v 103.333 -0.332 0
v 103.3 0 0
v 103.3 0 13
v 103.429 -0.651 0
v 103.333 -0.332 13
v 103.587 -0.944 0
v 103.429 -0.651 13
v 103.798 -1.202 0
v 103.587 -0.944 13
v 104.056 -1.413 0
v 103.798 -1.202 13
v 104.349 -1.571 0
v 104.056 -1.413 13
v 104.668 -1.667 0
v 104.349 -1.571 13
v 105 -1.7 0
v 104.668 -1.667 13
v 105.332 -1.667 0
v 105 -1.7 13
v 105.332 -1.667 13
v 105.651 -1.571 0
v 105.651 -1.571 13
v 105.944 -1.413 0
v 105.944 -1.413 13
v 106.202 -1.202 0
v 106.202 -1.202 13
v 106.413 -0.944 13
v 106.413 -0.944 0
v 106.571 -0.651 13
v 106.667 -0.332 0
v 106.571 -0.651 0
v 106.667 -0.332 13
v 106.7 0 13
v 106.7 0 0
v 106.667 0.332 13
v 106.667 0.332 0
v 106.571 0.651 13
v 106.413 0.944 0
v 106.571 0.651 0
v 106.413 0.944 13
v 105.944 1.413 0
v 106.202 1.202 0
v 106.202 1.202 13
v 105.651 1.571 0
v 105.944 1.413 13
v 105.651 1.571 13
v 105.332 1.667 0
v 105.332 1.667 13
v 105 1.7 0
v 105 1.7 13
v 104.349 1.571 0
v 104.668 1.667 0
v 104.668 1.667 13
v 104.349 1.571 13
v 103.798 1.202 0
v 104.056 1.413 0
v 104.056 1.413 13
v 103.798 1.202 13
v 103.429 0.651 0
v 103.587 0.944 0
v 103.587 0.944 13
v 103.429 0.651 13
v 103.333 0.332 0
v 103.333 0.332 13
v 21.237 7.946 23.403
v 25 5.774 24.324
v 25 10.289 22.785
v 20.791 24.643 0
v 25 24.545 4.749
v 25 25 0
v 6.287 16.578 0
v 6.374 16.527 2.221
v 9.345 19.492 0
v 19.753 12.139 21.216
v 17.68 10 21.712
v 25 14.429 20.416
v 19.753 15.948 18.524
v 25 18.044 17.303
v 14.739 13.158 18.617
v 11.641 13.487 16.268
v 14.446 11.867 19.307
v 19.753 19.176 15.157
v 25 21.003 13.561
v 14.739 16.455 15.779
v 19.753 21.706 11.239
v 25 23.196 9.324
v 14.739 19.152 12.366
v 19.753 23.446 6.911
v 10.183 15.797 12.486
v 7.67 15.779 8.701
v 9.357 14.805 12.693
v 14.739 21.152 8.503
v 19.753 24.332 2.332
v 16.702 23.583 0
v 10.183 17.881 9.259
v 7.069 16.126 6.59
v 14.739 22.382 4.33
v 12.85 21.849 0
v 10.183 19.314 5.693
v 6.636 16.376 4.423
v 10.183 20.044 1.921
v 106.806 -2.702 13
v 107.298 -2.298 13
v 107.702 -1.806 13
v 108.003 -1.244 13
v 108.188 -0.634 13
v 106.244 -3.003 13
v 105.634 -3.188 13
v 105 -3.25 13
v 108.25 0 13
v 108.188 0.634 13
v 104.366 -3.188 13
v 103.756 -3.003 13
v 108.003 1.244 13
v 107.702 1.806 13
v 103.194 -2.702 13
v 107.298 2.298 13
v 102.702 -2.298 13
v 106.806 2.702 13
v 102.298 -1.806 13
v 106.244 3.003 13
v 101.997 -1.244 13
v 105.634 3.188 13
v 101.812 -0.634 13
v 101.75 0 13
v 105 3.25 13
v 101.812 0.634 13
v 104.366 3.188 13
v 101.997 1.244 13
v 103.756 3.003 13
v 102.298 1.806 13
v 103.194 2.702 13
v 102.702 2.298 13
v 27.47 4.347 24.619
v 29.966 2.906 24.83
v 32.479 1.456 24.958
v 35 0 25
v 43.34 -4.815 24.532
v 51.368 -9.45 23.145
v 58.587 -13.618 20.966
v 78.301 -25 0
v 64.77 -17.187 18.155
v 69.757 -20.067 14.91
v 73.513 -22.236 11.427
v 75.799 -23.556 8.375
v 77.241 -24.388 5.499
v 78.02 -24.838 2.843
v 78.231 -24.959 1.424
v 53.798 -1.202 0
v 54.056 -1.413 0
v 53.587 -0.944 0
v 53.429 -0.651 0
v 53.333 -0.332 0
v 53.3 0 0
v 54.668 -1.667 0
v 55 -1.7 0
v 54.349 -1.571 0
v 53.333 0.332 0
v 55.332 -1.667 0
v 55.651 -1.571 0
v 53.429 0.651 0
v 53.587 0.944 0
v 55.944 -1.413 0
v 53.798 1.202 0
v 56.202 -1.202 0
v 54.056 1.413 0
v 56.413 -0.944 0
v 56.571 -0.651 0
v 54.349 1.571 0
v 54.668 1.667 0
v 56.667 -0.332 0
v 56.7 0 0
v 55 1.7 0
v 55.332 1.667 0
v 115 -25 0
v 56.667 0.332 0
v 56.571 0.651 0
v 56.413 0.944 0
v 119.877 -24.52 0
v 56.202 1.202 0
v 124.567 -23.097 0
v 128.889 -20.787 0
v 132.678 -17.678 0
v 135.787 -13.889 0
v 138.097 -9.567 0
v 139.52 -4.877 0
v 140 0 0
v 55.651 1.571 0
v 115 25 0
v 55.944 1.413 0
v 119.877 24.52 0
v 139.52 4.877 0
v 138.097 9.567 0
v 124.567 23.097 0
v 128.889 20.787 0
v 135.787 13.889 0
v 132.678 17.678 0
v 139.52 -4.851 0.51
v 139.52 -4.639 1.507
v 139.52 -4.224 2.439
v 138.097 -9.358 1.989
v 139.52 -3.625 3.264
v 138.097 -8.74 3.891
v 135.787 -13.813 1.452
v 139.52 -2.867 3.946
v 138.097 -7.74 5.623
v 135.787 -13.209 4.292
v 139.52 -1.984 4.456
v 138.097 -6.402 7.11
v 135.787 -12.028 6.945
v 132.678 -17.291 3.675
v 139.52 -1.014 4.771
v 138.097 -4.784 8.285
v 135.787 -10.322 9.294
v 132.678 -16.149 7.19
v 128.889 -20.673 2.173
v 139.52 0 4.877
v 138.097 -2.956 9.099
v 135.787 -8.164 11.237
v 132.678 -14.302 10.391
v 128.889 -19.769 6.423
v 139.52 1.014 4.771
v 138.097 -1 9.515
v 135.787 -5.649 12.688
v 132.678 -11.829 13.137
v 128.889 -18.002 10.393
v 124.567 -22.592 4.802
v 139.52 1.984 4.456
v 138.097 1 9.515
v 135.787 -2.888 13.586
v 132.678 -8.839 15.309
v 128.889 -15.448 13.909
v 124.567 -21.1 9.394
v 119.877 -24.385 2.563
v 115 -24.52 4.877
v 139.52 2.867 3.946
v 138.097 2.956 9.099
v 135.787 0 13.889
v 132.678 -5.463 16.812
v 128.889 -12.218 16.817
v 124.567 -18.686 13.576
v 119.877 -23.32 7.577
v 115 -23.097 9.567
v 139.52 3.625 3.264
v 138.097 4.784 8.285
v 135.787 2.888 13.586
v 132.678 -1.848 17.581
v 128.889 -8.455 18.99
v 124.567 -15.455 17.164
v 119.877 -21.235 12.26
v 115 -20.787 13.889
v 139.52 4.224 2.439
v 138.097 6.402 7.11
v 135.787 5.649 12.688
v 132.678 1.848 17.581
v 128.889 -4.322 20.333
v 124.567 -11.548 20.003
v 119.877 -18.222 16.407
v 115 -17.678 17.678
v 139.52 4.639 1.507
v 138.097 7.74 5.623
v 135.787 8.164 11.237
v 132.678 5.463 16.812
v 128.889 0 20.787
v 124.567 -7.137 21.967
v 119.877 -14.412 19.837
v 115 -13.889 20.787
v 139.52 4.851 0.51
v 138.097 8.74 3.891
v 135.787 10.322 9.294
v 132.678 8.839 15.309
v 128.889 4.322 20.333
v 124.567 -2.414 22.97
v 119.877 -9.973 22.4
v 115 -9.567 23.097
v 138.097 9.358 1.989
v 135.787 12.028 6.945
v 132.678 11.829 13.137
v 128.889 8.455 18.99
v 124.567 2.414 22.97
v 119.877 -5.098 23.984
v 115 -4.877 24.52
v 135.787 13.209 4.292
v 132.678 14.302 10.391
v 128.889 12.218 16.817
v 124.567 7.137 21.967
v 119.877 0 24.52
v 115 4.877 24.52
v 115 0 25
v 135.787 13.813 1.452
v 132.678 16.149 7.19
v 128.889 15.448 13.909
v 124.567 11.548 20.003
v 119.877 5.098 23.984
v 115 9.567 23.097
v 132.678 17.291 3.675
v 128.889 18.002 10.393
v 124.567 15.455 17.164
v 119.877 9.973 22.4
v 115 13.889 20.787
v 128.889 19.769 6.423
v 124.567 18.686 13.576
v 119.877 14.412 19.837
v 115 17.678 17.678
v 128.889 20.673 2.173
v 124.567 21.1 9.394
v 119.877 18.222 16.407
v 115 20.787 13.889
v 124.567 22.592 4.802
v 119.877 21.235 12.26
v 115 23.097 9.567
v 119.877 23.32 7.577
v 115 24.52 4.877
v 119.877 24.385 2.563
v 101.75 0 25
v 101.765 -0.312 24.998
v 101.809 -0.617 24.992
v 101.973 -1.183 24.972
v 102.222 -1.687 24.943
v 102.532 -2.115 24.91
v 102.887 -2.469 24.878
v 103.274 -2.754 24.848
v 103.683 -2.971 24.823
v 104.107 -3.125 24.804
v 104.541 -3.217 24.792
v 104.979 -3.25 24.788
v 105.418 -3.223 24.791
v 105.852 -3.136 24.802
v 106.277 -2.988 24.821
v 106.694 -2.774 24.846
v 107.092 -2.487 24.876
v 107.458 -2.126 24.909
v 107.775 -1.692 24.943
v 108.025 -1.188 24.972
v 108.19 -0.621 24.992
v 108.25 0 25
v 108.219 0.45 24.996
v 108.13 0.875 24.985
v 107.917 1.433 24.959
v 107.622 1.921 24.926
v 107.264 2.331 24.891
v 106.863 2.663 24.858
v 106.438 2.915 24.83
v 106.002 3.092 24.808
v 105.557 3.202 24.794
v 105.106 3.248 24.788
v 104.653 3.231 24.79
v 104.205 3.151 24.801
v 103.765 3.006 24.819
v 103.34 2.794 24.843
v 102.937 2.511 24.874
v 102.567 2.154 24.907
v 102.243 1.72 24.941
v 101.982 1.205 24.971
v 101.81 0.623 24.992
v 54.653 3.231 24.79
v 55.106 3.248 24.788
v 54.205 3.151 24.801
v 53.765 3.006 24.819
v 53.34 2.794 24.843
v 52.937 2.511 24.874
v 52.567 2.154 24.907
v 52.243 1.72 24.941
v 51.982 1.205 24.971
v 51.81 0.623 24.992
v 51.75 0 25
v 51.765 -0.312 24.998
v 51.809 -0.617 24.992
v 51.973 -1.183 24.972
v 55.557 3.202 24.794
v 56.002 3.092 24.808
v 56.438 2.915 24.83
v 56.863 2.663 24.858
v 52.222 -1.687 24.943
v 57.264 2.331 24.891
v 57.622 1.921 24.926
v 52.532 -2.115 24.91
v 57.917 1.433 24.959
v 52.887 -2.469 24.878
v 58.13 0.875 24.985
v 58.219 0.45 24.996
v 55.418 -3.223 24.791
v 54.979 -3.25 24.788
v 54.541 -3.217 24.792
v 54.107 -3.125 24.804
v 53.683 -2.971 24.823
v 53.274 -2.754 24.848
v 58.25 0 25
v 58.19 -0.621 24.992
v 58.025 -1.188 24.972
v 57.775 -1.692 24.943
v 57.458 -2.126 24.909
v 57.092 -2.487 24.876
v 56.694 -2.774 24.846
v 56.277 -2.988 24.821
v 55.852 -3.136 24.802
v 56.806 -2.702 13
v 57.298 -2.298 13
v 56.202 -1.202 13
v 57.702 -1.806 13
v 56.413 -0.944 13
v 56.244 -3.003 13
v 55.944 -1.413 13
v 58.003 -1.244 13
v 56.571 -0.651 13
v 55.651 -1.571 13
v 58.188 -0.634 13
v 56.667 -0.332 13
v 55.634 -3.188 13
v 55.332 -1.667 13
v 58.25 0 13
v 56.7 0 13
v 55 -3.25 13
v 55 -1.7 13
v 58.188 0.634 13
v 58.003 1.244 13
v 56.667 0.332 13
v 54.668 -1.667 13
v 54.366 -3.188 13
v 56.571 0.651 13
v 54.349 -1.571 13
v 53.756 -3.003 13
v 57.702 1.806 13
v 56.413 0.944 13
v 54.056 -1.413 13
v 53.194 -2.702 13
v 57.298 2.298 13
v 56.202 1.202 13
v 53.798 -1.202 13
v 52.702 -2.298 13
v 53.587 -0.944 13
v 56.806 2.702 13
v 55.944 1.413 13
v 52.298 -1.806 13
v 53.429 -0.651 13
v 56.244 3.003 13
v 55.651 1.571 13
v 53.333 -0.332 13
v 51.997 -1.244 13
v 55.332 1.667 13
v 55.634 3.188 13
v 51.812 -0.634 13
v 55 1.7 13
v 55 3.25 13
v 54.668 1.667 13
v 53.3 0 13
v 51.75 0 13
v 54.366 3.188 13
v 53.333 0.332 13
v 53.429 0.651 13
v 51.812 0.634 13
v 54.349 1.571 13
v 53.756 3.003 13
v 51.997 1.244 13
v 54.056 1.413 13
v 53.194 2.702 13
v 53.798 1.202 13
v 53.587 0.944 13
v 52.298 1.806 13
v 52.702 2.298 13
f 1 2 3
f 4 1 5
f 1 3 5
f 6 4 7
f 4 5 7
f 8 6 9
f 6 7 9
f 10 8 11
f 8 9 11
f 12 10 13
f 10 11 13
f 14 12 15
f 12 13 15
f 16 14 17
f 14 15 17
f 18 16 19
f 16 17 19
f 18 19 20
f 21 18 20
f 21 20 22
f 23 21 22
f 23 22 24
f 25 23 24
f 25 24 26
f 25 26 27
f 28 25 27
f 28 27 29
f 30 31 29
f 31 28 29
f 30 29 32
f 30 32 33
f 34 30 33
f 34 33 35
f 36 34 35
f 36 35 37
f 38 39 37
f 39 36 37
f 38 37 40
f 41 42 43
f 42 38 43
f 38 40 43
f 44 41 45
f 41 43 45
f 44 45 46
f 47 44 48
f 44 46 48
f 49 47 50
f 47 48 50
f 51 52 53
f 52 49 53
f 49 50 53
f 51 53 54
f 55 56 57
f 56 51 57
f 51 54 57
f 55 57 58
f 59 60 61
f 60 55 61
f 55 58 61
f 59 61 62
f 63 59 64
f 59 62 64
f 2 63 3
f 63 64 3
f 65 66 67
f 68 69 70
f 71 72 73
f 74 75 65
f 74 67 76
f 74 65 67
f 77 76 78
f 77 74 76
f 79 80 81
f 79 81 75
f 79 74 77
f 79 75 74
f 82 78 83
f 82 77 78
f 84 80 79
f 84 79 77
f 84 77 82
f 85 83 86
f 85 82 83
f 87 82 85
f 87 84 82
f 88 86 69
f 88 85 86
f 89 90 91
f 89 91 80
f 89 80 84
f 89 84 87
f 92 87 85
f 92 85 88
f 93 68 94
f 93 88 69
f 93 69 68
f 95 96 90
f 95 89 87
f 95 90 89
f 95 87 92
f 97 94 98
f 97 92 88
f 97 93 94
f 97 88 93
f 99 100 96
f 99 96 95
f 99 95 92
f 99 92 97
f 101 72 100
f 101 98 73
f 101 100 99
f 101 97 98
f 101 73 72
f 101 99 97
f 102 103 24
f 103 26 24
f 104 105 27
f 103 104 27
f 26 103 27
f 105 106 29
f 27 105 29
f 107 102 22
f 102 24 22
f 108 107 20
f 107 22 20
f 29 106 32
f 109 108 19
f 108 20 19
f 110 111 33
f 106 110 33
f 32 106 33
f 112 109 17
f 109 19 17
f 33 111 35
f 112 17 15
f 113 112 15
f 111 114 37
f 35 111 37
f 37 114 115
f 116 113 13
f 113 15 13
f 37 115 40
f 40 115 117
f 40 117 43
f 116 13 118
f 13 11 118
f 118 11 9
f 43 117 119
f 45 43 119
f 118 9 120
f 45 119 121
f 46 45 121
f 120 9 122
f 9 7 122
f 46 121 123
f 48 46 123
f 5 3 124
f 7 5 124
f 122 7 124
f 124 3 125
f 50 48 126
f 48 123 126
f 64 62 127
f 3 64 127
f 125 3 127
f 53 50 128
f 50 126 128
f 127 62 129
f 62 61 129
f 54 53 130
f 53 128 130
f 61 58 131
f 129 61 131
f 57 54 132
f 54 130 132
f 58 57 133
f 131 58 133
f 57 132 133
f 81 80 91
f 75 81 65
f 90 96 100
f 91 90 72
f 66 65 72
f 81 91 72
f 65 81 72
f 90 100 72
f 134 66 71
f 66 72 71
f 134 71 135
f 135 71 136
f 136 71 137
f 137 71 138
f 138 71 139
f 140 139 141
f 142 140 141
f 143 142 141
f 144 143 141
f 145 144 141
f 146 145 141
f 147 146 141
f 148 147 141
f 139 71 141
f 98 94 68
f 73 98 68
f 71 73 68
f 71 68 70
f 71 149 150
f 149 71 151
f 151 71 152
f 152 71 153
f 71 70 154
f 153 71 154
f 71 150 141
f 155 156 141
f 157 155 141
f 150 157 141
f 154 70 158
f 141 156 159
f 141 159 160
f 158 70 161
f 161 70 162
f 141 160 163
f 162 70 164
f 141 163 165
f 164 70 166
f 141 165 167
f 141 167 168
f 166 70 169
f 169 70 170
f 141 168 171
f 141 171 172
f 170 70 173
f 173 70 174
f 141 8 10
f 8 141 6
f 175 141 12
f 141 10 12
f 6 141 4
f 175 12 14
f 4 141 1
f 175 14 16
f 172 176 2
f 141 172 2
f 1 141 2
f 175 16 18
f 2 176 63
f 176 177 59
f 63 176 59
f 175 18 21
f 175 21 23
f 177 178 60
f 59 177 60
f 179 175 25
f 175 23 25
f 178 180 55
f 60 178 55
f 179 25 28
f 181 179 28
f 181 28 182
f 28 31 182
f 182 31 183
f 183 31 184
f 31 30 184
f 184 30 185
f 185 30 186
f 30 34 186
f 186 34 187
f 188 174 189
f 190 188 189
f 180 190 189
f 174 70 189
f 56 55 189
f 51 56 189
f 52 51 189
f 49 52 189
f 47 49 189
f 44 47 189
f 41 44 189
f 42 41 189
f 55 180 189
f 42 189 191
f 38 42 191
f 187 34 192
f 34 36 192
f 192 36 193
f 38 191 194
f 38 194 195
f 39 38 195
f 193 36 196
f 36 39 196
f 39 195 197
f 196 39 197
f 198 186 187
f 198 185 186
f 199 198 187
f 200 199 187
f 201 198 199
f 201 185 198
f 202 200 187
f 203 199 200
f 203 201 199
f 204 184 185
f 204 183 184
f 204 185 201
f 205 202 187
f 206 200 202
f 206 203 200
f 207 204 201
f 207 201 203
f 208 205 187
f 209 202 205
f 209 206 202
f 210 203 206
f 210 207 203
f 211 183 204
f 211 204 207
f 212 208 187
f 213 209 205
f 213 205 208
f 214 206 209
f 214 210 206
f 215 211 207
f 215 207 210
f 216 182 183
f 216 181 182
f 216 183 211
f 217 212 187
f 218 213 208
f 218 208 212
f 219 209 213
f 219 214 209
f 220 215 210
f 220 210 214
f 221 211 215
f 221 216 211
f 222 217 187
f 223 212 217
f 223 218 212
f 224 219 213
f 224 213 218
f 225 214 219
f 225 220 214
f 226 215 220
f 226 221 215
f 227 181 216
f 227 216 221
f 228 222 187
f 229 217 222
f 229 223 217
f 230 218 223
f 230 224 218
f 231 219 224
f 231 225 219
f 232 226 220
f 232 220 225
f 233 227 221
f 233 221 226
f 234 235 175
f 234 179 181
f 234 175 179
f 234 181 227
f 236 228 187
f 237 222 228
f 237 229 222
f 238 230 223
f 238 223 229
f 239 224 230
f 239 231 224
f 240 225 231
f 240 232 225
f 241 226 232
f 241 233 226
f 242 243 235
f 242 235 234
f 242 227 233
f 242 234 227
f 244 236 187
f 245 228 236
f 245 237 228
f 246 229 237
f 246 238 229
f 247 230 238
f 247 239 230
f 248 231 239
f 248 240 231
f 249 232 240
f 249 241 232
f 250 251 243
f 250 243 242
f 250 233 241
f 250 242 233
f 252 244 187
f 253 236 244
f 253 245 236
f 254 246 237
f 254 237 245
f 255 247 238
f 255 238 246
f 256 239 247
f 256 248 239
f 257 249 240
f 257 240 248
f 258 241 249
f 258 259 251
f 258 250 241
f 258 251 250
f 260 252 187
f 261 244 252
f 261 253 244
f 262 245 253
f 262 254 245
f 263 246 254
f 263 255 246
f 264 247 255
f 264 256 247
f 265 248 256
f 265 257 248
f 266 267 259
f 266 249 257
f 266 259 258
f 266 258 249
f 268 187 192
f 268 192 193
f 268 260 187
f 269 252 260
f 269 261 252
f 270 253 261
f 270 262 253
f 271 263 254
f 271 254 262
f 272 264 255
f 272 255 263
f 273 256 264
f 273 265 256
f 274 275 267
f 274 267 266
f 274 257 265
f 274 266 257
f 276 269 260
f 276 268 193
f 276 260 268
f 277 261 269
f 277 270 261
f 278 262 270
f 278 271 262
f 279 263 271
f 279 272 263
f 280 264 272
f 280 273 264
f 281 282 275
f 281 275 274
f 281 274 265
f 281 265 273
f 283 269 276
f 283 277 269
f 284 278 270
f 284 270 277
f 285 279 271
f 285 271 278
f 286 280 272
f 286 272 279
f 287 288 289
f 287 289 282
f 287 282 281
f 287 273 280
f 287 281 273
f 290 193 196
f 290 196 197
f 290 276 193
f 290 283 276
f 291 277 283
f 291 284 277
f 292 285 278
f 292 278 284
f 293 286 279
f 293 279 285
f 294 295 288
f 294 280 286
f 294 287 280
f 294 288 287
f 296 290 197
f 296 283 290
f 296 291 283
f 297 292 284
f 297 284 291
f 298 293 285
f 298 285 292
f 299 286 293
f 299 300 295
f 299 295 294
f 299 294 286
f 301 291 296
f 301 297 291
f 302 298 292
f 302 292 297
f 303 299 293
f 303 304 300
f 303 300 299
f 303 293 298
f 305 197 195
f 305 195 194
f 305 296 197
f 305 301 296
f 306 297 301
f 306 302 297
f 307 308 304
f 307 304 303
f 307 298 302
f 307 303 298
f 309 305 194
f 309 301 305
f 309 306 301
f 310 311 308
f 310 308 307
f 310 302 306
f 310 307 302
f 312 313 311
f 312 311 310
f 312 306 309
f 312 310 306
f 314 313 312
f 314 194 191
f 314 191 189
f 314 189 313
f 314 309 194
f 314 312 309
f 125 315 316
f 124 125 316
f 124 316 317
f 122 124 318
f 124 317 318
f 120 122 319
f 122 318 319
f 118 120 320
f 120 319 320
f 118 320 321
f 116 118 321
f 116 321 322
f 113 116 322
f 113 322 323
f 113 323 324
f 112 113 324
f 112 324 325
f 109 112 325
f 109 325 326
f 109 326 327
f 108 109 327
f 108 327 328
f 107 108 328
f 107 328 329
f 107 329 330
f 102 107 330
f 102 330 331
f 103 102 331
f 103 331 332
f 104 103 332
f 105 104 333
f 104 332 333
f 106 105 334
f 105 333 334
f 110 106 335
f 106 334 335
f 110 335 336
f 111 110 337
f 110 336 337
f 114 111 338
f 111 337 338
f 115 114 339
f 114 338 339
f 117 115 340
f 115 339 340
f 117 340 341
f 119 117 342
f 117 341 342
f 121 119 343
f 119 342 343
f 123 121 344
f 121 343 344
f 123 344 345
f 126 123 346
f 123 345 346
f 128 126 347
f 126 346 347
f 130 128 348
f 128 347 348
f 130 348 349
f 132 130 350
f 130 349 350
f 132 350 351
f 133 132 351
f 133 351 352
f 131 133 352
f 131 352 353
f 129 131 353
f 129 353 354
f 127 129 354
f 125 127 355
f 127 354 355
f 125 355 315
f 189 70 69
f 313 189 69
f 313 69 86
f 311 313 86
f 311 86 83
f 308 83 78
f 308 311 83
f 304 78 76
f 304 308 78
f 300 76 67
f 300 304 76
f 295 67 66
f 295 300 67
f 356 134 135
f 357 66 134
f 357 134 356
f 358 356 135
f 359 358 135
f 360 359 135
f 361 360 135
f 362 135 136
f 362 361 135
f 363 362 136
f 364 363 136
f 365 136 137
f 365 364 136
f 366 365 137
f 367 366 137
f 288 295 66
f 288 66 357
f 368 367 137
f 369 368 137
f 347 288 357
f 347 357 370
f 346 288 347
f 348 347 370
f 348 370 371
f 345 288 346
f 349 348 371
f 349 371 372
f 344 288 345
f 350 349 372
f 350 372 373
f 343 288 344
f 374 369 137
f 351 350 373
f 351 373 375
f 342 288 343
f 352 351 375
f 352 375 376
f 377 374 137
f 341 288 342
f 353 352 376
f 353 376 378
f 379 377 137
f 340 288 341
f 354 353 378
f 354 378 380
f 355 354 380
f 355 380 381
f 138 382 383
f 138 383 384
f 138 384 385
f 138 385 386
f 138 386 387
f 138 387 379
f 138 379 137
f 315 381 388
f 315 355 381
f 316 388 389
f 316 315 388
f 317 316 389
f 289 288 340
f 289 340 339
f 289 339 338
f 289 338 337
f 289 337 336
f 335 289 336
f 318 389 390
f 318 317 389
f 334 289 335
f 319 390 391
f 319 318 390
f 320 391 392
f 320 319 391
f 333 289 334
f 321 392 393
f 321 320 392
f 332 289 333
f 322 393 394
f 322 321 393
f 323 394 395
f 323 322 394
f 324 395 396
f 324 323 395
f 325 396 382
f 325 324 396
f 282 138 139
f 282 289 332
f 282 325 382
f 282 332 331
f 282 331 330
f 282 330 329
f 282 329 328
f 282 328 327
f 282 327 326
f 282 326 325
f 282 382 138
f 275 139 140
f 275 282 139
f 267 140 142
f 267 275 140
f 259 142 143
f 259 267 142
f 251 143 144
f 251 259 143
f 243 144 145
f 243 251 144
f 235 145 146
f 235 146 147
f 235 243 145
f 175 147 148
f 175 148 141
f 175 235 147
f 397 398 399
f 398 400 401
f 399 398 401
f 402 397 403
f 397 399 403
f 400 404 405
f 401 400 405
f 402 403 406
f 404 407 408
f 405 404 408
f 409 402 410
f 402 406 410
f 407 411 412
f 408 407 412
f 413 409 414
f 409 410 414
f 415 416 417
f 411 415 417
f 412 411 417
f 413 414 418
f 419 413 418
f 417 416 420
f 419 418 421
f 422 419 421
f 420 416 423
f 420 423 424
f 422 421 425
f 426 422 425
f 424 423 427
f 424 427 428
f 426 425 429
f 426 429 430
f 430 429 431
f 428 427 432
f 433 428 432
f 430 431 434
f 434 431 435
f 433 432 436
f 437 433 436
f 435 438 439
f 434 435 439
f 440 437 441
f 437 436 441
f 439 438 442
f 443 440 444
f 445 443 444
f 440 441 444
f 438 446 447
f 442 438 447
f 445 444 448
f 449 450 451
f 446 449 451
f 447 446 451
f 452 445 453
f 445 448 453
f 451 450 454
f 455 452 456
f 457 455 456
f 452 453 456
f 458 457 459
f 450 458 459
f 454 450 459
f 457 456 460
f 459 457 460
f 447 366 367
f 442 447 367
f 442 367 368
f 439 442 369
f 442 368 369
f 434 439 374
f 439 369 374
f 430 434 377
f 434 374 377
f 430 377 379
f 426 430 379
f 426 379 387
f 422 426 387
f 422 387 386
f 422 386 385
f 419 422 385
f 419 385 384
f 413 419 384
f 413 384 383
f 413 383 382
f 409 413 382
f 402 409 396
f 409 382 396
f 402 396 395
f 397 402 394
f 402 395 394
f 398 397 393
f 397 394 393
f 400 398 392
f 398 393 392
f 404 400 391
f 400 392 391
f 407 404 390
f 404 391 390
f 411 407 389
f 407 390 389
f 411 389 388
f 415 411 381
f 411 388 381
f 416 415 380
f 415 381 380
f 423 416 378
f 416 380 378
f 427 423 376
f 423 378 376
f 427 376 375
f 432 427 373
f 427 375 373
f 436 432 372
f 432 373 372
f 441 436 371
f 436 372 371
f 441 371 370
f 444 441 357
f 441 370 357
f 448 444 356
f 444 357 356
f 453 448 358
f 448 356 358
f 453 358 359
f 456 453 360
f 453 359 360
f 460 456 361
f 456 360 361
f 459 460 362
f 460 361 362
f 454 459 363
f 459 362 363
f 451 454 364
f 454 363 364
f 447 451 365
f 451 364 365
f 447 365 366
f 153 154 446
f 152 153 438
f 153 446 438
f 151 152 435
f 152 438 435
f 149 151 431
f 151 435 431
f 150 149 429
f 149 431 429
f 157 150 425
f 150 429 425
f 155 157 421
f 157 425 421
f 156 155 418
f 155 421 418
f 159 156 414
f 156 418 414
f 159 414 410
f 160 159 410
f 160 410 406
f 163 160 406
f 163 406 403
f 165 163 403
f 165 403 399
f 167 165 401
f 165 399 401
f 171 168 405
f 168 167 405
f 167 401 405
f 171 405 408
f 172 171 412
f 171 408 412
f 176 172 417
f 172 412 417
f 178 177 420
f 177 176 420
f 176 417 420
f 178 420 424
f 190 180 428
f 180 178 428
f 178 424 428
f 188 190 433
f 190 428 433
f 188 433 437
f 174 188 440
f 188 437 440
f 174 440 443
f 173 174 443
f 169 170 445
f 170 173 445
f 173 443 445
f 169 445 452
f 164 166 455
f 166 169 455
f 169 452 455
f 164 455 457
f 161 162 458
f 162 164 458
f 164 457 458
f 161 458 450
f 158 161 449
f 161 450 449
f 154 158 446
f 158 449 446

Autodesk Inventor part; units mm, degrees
ref_plane "Plan YZ" through (0, 0, 0) normal (1, 0, 0) x (0, 1, 0)
ref_plane "Plan XZ" through (0, 0, 0) normal (0, 1, 0) x (-1, 0, 0)
sketch "Esquisse1" plane through (0, 0, 0) normal (0, 0, 1) x (1, 0, 0)
  arc A0 (25, 25) -> (0, 0) centre (25, 0) ccw
  line L0 (25, 25) -> (115, 25)
  arc A1 (140, 0) -> (115, 25) centre (115, 0) ccw
  line L1 (0, 0) -> (132.1239, 0) construction
  line L2 (0, 0) -> (140, 0)
  dimension "d0" = 25
  dimension "d1" = 90
revolve "Révolution1" add sketch "Esquisse1" angle 180 about axis through (0, 0, 0) along (1, 0, 0)
sketch "Esquisse6" plane through (115, 25, 0) normal (0, 0, -1) x (-1, 0, 0)
  line L0 (36.6987, -50) -> (51.6987, -75.9808)
  line L1 (51.6987, -75.9808) -> (115, -39.4338)
  arc A0 (90, -50) -> (90, 0) centre (90, -25) ccw projected
  line L2 (90, 0) -> (0, 0) projected
  line L3 (115, -25) -> (-35.1202, -25) construction
  line L4 (0, -50) -> (90, -50) projected
  line L5 (108.7132, -8.4224) -> (36.6987, -50)
  line L6 (108.7132, -8.4224) -> (115, -8.4224)
  line L7 (115, -8.4224) -> (115, -39.4338)
  dimension "d17" = 30
  dimension "d18" = 30
extrude "Extrusion1" cut sketch "Esquisse6" against normal blind 25
ref_plane "Plan de construction1" through (115, -25, 25) normal (0, 0, -1) x (-1, 0, 0)
sketch "Esquisse7" plane through (115, -25, 25) normal (0, 0, -1) x (-1, 0, 0)
  circle A0 centre (10, 25) radius 1.7
  circle A1 centre (60, 25) radius 1.7
  line L0 (0, 50) -> (0, 0) projected
  line L1 (10, 25) -> (10, 0) construction
  line L2 (10, 25) -> (10, 50) construction
  line L3 (60, 25) -> (60, 0) construction
  line L4 (60, 25) -> (60, 50) construction
  line L5 (0, 50) -> (95.4771, 50) construction
  line L6 (0, 0) -> (90, 0) construction
  point P0 (115, 25)
  dimension "d7" = 10
  dimension "d8" = 50
  dimension "d9" = 3.4
  dimension "d10" = 3.4
extrude "Extrusion2" cut sketch "Esquisse7" along normal blind 25
sketch "Esquisse8" plane through (115, -25, 25) normal (0, 0, -1) x (-1, 0, 0)
  circle A0 centre (10, 25) radius 3.25
  circle A1 centre (60, 25) radius 3.25
  circle A2 centre (10, 25) radius 1.7 projected
  circle A3 centre (60, 25) radius 1.7 projected
  point P0 (115, 25)
  dimension "d13" = 6.5
  dimension "d14" = 6.5
extrude "Extrusion3" cut sketch "Esquisse8" along normal blind 12 contours A0 | A1 | A2 | A3
equation "\"d10\" = d9"
equation "\"d14\" = d13"
properties part number "P1704_003" material "."
